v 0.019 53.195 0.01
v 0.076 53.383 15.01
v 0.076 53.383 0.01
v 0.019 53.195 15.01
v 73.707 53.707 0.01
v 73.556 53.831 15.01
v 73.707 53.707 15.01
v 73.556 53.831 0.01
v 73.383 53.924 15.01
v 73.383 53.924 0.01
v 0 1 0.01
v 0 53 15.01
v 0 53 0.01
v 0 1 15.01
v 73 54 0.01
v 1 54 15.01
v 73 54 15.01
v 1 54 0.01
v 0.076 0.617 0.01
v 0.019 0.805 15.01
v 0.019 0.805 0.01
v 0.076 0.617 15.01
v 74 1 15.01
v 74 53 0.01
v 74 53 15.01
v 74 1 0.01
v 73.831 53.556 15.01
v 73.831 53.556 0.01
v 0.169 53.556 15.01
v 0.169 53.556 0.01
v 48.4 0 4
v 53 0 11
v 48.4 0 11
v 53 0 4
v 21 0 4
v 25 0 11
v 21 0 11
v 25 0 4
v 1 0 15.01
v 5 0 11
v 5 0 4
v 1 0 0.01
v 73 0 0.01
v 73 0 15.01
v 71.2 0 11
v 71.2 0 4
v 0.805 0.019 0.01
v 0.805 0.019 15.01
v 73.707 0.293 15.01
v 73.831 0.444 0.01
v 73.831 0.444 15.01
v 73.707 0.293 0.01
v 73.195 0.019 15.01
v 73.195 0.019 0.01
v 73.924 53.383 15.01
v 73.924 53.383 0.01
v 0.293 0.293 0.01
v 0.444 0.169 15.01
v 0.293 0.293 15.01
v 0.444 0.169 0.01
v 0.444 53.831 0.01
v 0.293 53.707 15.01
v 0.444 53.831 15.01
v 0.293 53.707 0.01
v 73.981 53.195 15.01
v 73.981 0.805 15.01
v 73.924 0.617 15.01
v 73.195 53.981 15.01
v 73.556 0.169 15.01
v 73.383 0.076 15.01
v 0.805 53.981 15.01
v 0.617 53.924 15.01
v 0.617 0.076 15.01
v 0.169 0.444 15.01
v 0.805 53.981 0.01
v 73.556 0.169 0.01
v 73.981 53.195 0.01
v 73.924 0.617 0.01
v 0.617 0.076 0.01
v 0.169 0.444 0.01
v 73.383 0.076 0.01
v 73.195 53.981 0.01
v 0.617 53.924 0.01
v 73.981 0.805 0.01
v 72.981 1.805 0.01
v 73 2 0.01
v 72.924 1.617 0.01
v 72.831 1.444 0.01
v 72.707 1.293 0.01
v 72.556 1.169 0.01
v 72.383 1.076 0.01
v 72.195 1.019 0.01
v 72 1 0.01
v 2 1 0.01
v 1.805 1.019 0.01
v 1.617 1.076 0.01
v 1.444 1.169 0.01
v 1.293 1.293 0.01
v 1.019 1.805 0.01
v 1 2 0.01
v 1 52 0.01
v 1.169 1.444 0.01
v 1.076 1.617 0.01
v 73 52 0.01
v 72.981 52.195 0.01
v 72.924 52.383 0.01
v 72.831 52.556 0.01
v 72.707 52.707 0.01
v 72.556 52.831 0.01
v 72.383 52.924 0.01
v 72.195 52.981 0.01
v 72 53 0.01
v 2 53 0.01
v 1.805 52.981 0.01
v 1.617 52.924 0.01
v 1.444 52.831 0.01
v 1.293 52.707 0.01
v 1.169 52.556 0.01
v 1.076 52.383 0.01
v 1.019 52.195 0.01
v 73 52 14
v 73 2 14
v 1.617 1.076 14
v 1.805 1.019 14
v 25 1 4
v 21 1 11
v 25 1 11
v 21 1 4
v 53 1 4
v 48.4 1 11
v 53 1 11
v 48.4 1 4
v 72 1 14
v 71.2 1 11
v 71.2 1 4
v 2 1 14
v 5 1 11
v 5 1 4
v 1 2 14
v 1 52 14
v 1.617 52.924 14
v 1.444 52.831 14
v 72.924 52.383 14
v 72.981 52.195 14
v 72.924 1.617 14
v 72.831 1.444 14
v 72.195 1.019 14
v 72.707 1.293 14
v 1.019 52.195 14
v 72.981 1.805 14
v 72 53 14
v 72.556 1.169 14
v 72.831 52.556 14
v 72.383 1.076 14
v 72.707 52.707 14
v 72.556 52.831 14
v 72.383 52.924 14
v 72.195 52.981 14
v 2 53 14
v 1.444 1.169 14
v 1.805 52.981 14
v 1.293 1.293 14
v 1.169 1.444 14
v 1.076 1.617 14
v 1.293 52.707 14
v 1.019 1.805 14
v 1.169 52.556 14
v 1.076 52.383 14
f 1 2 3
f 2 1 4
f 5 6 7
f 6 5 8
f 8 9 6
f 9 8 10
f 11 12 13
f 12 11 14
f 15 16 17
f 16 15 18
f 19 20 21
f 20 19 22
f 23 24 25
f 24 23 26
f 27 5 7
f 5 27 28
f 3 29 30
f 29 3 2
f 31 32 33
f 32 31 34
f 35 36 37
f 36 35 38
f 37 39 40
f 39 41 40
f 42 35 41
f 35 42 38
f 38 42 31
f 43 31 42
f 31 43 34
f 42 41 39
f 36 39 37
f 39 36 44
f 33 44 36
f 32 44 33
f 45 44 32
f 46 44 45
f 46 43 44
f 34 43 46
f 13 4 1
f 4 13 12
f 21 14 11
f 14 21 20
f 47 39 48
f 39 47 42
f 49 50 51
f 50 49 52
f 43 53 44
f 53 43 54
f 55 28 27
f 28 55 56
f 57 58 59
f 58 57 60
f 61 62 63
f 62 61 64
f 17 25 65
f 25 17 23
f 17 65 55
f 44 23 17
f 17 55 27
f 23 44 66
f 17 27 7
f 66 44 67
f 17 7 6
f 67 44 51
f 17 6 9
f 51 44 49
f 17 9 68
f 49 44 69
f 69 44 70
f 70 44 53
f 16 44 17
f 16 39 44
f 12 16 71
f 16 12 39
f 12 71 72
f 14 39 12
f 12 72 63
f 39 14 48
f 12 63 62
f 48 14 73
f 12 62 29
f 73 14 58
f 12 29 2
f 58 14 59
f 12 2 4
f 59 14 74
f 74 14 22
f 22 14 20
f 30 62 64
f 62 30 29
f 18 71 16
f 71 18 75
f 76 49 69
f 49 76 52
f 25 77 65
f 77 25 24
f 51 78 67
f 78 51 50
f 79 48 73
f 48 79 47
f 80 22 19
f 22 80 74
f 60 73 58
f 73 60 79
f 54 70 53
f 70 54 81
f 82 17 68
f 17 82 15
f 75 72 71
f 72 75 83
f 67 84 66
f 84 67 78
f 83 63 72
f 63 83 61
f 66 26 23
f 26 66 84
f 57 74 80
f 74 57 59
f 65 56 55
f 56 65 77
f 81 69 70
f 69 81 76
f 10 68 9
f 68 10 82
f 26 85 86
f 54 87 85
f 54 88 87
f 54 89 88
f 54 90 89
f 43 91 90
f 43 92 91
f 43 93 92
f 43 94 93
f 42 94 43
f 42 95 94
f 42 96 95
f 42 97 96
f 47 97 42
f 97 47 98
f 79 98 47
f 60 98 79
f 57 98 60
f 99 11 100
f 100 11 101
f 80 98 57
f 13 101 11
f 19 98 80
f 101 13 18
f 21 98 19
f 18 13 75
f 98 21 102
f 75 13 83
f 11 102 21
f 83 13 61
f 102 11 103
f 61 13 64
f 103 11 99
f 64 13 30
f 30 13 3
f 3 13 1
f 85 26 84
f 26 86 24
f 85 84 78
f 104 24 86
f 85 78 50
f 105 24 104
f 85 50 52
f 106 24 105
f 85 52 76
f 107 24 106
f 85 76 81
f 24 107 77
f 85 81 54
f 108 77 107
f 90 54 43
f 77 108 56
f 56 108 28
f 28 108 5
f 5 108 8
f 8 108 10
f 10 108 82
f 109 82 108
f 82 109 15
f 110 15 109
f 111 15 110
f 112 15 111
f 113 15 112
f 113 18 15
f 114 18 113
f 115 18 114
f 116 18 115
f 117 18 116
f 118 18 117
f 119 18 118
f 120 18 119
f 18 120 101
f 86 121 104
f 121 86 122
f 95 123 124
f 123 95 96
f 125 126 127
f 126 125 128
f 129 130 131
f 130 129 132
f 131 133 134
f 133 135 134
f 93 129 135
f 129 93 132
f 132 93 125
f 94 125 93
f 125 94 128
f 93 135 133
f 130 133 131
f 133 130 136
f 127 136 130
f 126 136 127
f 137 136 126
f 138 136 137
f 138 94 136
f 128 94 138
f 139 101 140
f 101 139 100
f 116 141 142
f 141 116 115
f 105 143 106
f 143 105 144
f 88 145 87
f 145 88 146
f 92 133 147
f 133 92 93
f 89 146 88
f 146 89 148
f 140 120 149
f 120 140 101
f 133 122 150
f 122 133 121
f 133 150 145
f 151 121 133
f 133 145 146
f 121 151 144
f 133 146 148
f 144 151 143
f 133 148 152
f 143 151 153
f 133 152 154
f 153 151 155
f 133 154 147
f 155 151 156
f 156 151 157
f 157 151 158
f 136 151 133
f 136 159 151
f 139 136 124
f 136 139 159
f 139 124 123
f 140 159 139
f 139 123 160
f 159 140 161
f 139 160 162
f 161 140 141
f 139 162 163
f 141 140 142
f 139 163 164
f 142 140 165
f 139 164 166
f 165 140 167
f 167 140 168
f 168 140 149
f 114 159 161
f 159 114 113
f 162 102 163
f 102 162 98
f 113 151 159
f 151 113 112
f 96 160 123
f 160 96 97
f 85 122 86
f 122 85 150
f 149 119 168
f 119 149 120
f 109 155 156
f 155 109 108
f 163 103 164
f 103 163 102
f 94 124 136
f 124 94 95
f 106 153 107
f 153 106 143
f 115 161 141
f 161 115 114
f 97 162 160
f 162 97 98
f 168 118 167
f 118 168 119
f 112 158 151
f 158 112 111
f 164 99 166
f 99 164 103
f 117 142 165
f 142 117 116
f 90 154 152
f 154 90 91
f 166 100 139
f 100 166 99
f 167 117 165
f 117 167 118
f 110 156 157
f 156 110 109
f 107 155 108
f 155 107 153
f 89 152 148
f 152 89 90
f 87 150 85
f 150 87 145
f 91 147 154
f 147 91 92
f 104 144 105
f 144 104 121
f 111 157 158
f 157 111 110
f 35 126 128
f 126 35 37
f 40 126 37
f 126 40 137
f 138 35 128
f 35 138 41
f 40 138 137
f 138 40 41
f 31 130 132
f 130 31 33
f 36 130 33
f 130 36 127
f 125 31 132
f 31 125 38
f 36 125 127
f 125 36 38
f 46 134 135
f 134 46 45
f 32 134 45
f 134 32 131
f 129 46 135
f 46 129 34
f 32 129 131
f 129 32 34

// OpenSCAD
// file: ../MODULES/roundedcube.scad
// Original source: https://danielupshaw.com/openscad-rounded-corners/

// use this for working
$fs = 0.2;
// use the for rendering
// $fs = 0.02;

module roundedcube(size = [1, 1, 1], center = false, radius = 0.5, apply_to = "all") {
	// If single value, convert to [x, y, z] vector
	size = (size[0] == undef) ? [size, size, size] : size;

	translate_min = radius;
	translate_xmax = size[0] - radius;
	translate_ymax = size[1] - radius;
	translate_zmax = size[2] - radius;

	diameter = radius * 2;

	module build_point(type = "sphere", rotate = [0, 0, 0]) {
		if (type == "sphere") {
			sphere(r = radius);
		} else if (type == "cylinder") {
			rotate(a = rotate)
			cylinder(h = diameter, r = radius, center = true);
		}
	}

	obj_translate = (center == false) ?
		[0, 0, 0] : [
			-(size[0] / 2),
			-(size[1] / 2),
			-(size[2] / 2)
		];

	translate(v = obj_translate) {
		hull() {
			for (translate_x = [translate_min, translate_xmax]) {
				x_at = (translate_x == translate_min) ? "min" : "max";
				for (translate_y = [translate_min, translate_ymax]) {
					y_at = (translate_y == translate_min) ? "min" : "max";
					for (translate_z = [translate_min, translate_zmax]) {
						z_at = (translate_z == translate_min) ? "min" : "max";

						translate(v = [translate_x, translate_y, translate_z])
						if (
							(apply_to == "all") ||
							(apply_to == "xmin" && x_at == "min") || (apply_to == "xmax" && x_at == "max") ||
							(apply_to == "ymin" && y_at == "min") || (apply_to == "ymax" && y_at == "max") ||
							(apply_to == "zmin" && z_at == "min") || (apply_to == "zmax" && z_at == "max")
						) {
							build_point("sphere");
						} else {
							rotate = 
								(apply_to == "xmin" || apply_to == "xmax" || apply_to == "x") ? [0, 90, 0] : (
								(apply_to == "ymin" || apply_to == "ymax" || apply_to == "y") ? [90, 90, 0] :
								[0, 0, 0]
							);
							build_point("cylinder", rotate);
						}
					}
				}
			}
		}
	}
}

module shull_cube(size = [1, 1, 1], center = false, radius = 0, apply_to = "all") {
    if (radius == 0) {
        cube(size, center);
    } else {
        roundedcube(size, center, radius, apply_to);
    }
}
// main file
// Electronics Enclosure OpenSCAD Template
//  By Carsten Thue-Bludworth

use <../MODULES/roundedcube.scad>;

// Global configuration
$fa = 1;
$fs = 0.4;
// Amount of offset to help OpenSCAD with unions and diffs
_DELTA = 0.01;
// The amount of space between the PCB edge and the inner wall of enclosure
MARGIN = 1;
// The thickness of the enclosure wall
WALL_THICKNESS = 1;
// Dimensions of the PCB
PCB_X = 70;
ENC_X_INNER = PCB_X + 2*MARGIN;
ENC_X_OUTER = PCB_X + 2*(MARGIN + WALL_THICKNESS);
PCB_Y = 50;
ENC_Y_INNER = PCB_Y + 2*MARGIN;
ENC_Y_OUTER = PCB_Y + 2*(MARGIN + WALL_THICKNESS);
PCB_Z = 15;
PCB_RADIUS = 1;

// Enclosure body
module body() {
    difference() {
        translate([0, 0, _DELTA])
            roundedcube([ENC_X_OUTER, ENC_Y_OUTER, PCB_Z], radius=PCB_RADIUS, apply_to="z");
        translate([WALL_THICKNESS, WALL_THICKNESS, 0])
            roundedcube([ENC_X_INNER, ENC_Y_INNER, PCB_Z-WALL_THICKNESS], radius=PCB_RADIUS, apply_to="z");
    }
}

// Top cutouts
co_x  = 10;
co_offset_x = 10;
co_y  = 10;
co_offset_y = 10;
co_z  =  1;

module top_cutout(x=1, y=1, x_off=0, y_off=0) {
    translate([x_off, y_off, PCB_Z-WALL_THICKNESS-_DELTA])
        cube([x, y, WALL_THICKNESS+(3*_DELTA)]);
}

// Front cutouts
f_co1_x = 16;
f_co1_x_off = 5;
f_co1_z = 7;
f_co1_z_off = 4;

f_co2_x = 23.4;
f_co2_x_off = 25;
f_co2_z = 7;
f_co2_z_off = 4;

f_co3_x = 18.2;
f_co3_x_off = 53;
f_co3_z = 7;
f_co3_z_off = 4;

module front_cutout(x=1, z=1, x_off=0, z_off=0) {
    translate([x_off, -_DELTA, z_off])
        cube([x, WALL_THICKNESS+(2*_DELTA), z]);
}

// Main model
difference() {
    body();
    //top_cutout(co_x, co_y, co_offset_x, co_offset_y);
    front_cutout(f_co1_x, f_co1_z, f_co1_x_off, f_co1_z_off);
    front_cutout(f_co2_x, f_co2_z, f_co2_x_off, f_co2_z_off);
    front_cutout(f_co3_x, f_co3_z, f_co3_x_off, f_co3_z_off);
}
